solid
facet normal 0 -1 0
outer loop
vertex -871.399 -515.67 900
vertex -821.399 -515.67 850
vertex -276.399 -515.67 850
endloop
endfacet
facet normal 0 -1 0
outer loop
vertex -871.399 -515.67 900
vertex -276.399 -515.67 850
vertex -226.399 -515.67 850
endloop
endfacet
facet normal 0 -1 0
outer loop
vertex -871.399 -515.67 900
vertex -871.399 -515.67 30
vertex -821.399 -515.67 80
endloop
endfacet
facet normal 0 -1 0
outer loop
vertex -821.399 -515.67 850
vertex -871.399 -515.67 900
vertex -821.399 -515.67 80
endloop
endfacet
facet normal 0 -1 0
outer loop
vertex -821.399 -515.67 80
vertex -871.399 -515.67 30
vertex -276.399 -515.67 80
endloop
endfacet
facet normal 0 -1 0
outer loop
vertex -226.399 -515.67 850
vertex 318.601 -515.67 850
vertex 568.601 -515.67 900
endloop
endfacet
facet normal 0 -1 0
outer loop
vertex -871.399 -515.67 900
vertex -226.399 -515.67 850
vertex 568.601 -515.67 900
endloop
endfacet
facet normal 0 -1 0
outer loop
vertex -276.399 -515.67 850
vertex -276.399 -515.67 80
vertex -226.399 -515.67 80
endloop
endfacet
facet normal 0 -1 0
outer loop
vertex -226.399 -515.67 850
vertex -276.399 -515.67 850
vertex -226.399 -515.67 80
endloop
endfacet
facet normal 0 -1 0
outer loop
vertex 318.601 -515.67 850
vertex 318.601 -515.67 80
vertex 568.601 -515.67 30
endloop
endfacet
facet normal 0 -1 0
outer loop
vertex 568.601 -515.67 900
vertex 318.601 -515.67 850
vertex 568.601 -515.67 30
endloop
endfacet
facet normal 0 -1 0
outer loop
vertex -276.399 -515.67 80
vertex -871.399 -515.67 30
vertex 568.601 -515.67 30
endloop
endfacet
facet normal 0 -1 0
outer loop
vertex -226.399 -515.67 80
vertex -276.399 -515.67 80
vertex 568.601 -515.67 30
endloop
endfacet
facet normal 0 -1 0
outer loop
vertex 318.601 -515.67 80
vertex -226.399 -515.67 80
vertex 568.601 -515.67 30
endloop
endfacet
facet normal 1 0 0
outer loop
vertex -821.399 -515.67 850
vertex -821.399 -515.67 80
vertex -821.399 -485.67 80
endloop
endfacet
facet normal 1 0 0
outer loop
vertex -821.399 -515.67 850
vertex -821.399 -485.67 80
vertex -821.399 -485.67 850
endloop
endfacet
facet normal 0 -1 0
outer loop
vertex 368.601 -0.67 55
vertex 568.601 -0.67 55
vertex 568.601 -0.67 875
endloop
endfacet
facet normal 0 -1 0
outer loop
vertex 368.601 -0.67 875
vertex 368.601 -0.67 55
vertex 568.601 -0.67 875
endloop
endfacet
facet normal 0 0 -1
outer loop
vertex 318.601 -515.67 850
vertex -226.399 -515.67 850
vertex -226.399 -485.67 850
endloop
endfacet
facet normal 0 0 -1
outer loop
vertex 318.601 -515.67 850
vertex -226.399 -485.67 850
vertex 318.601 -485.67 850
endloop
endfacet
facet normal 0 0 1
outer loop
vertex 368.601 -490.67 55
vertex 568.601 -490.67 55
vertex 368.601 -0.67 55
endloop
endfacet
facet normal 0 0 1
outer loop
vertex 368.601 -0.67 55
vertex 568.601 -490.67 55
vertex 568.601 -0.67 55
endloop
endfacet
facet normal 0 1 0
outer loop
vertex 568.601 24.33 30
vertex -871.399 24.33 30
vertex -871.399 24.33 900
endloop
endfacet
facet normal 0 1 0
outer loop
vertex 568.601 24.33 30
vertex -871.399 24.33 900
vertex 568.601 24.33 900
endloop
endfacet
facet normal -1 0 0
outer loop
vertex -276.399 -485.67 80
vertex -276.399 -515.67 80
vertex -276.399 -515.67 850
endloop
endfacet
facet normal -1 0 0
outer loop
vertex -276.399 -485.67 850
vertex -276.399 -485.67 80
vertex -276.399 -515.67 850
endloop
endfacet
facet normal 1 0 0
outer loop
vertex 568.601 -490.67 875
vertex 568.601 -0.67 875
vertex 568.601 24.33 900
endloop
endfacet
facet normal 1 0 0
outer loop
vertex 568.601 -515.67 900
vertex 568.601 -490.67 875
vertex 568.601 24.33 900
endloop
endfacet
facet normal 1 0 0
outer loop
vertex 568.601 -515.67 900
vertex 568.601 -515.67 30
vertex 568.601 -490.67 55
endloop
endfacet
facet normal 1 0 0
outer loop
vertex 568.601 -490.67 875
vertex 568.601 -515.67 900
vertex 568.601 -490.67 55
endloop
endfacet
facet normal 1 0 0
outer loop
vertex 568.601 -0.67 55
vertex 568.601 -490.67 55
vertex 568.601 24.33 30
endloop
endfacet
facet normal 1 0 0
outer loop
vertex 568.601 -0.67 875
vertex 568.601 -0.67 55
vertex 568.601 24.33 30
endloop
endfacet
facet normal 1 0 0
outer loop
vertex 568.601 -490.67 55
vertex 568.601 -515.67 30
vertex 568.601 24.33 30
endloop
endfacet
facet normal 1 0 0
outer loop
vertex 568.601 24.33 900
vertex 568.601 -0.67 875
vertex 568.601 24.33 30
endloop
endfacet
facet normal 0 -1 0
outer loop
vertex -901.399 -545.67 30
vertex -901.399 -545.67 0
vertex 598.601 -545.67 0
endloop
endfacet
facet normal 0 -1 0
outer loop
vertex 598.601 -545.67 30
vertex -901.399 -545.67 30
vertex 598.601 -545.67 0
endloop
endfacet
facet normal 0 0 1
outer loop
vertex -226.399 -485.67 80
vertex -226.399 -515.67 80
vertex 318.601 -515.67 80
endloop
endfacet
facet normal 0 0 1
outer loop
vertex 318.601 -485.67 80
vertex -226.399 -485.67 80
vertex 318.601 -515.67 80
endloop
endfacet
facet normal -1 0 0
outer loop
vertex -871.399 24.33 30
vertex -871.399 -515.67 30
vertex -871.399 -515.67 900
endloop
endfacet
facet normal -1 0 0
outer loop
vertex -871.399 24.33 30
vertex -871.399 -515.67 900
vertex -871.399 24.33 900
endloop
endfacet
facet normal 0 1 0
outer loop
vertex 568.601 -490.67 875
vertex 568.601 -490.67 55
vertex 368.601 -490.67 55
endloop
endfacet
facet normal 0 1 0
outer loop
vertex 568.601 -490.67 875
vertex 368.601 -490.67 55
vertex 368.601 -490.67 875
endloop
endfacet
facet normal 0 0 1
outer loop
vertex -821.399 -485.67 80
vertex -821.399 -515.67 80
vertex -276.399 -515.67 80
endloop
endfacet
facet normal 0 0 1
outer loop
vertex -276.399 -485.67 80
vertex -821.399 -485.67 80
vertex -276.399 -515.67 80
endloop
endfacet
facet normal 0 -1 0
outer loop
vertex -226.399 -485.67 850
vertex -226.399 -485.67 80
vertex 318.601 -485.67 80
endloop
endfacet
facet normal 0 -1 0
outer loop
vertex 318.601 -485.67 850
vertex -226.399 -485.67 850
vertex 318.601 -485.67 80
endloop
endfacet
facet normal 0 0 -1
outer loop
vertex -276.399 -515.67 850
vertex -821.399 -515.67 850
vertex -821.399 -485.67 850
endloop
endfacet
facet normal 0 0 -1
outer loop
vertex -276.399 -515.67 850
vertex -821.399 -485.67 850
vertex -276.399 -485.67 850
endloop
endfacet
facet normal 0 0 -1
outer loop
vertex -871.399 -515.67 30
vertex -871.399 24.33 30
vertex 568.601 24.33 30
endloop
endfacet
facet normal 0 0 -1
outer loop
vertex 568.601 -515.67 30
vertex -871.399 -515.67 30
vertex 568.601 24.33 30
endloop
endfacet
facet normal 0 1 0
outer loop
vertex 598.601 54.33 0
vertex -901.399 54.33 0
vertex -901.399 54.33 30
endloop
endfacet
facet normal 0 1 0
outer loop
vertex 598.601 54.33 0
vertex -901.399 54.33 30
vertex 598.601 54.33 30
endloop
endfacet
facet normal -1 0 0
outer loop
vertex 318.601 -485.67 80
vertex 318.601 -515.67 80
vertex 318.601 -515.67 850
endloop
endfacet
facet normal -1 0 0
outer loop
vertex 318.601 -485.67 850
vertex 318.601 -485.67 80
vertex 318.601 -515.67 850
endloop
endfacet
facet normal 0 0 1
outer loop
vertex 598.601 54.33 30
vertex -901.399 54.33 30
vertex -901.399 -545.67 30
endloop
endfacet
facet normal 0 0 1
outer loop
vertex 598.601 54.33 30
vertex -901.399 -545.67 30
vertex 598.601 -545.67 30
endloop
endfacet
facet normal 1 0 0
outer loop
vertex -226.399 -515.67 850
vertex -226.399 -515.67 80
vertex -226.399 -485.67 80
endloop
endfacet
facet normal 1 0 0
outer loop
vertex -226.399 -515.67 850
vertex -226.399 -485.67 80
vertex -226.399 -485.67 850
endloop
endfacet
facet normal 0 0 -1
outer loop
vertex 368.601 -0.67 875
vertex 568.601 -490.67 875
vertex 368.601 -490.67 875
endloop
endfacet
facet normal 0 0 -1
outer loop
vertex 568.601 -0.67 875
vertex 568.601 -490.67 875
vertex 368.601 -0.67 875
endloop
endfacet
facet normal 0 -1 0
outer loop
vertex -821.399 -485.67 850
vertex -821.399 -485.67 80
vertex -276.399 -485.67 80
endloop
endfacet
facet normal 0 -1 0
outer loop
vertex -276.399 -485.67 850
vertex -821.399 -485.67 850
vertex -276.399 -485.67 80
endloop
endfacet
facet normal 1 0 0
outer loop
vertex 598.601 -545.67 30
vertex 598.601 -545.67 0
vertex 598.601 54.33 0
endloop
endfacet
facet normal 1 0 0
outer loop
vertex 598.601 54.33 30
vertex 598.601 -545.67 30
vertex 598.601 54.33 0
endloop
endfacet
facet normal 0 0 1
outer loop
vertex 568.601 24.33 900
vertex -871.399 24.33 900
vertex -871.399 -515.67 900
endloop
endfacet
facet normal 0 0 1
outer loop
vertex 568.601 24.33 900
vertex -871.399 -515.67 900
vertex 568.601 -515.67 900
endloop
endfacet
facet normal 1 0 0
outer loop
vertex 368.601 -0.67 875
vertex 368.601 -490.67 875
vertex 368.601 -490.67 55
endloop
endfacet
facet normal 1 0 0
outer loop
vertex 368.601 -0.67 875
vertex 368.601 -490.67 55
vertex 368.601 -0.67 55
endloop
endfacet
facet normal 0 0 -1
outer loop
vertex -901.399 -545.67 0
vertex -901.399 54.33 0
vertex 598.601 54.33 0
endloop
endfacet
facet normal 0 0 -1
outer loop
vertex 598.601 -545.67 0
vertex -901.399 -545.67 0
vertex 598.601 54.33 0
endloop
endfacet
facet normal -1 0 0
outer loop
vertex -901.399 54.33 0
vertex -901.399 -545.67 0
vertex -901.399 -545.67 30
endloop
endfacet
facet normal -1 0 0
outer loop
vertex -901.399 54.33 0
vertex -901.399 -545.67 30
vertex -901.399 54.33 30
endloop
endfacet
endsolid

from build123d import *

# Parameters (mm, degrees)
F0_W     = 1500
F0_H     = 600
F1_DEPTH = 30
F2_W     = 1439.999984
F2_H     = 539.999984
F3_DEPTH = 870
F4_W     = 489.999984
F4_H     = 820
F5_DEPTH = 200
F6_W     = 544.999992
F6_H     = 770
F7_DEPTH = 30


with BuildPart() as f1:
    # F0 (on Top) → F1 (new body)
    with BuildSketch(Plane.XY):
        with Locations((-151.399113, -245.669692)):
            Rectangle(F0_W, F0_H)
    extrude(amount=F1_DEPTH)


with BuildPart() as f3:
    # F2 (on face) → F3 (new body)
    with BuildSketch(Plane.XY.offset(30)):
        with Locations((-151.399113, -245.669692)):
            Rectangle(F2_W, F2_H)
    extrude(amount=F3_DEPTH)

    # F4 (on face) → F5 (cut)
    with BuildSketch(Plane.YZ.offset(568.600879)):
        with Locations((-245.669692, 465)):
            Rectangle(F4_W, F4_H)
    extrude(amount=-F5_DEPTH, mode=Mode.SUBTRACT)

    # F6 (on face) → F7 (cut)
    with BuildSketch(Plane.XZ.offset(515.669684)):
        with Locations((46.100883, 465)):
            Rectangle(F6_W, F6_H)
        with Locations((-548.899109, 465)):
            Rectangle(F6_W, F6_H)
    extrude(amount=-F7_DEPTH, mode=Mode.SUBTRACT)


solid = Compound([f1.part, f3.part])
